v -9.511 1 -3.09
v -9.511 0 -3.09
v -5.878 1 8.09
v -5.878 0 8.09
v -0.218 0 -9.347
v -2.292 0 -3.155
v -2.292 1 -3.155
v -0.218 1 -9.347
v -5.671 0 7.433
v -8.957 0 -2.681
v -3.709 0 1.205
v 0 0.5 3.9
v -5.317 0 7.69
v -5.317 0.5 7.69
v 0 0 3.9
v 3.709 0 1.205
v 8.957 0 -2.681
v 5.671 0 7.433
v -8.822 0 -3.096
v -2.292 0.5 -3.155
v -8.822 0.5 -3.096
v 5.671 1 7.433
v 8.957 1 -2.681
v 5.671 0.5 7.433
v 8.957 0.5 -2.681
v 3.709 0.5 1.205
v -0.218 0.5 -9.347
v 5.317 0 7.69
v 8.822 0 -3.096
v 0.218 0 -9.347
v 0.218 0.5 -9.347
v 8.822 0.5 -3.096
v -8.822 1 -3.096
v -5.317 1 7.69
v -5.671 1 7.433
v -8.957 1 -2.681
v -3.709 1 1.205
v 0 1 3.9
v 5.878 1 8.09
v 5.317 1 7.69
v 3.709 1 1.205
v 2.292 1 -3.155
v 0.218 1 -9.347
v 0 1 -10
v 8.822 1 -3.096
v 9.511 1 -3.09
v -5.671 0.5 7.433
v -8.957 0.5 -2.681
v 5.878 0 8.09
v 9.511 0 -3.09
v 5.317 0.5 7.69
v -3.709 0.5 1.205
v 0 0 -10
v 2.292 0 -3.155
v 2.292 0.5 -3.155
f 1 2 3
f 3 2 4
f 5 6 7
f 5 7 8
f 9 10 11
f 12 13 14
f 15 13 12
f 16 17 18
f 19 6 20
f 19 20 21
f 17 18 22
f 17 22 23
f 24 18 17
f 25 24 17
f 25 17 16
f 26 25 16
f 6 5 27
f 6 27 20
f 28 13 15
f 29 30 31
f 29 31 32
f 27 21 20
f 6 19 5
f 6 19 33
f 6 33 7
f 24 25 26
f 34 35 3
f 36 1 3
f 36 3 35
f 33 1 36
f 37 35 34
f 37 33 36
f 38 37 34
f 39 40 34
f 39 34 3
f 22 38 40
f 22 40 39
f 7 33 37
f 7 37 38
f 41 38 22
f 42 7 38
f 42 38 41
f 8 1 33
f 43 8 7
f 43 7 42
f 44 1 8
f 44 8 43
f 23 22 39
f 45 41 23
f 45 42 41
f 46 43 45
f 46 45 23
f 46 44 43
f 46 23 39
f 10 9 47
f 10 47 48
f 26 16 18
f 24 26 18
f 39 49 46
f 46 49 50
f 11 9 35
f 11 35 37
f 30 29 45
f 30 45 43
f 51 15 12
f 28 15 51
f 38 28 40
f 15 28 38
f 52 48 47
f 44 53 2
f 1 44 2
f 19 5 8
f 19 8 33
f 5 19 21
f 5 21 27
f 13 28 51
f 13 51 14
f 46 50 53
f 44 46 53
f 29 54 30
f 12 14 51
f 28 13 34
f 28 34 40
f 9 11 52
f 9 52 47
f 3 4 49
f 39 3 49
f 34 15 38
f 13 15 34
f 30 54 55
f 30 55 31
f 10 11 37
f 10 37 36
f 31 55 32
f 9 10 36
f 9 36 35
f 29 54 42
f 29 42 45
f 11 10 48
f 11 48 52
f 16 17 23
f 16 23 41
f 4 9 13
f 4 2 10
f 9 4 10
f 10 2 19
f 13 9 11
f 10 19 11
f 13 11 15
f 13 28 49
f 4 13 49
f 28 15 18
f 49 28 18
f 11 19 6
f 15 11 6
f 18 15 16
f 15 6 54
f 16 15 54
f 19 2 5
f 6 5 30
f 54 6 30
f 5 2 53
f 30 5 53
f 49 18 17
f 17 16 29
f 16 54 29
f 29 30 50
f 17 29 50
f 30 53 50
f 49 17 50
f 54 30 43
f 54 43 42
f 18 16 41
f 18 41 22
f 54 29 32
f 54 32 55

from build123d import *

# Parameters (mm, degrees)
BOSS_EXTRUDE1_DEPTH   = 1
BOSS_EXTRUDE2_DEPTH   = 0.5
BOSS_EXTRUDE2_2_DEPTH = 0.5
BOSS_EXTRUDE2_3_DEPTH = 0.5
BOSS_EXTRUDE2_4_DEPTH = 0.5
BOSS_EXTRUDE2_5_DEPTH = 0.5


with BuildPart() as part:
    # Sketch1 → Boss-Extrude1 (new body)
    with BuildSketch(Plane(origin=(0, 0, 0), x_dir=(1, 0, 0), z_dir=(0, 1, 0))):
        Polygon((9.510565163, 3.090169944), (0, 10), (-9.510565163, 3.090169944), (-5.877852523, -8.090169944), (5.877852523, -8.090169944), align=None)
        Polygon((5.6706701, -7.433384684), (8.956902373, 2.68059828), (3.709120414, -1.205166278), align=None, mode=Mode.SUBTRACT)
        Polygon((8.821902373, 3.096085557), (0.218434588, 9.346870791), (2.292362484, 3.155166278), align=None, mode=Mode.SUBTRACT)
        Polygon((-0.218434588, 9.346870791), (-8.821902373, 3.096085557), (-2.292362484, 3.155166278), align=None, mode=Mode.SUBTRACT)
        Polygon((-8.956902373, 2.68059828), (-5.6706701, -7.433384684), (-3.709120414, -1.205166278), align=None, mode=Mode.SUBTRACT)
        Polygon((-5.316743775, -7.690169944), (5.317235512, -7.690169944), (0, -3.9), align=None, mode=Mode.SUBTRACT)
    extrude(amount=BOSS_EXTRUDE1_DEPTH)


with BuildPart() as body_2:
    # Sketch3 → Boss-Extrude2 (new body)
    with BuildSketch(Plane.XZ):
        Polygon((8.956902373, -2.68059828), (3.709120414, 1.205166278), (5.6706701, 7.433384684), align=None)
    extrude(amount=-BOSS_EXTRUDE2_DEPTH)


with BuildPart() as body_3:
    # Sketch3 → Boss-Extrude2 2 (new body)
    with BuildSketch(Plane.XZ):
        Polygon((8.821902373, -3.096085557), (2.292362484, -3.155166278), (0.218434588, -9.346870791), align=None)
    extrude(amount=-BOSS_EXTRUDE2_2_DEPTH)


with BuildPart() as body_4:
    # Sketch3 → Boss-Extrude2 3 (new body)
    with BuildSketch(Plane.XZ):
        Polygon((-0.218434588, -9.346870791), (-2.292362484, -3.155166278), (-8.821902373, -3.096085557), align=None)
    extrude(amount=-BOSS_EXTRUDE2_3_DEPTH)


with BuildPart() as body_5:
    # Sketch3 → Boss-Extrude2 4 (new body)
    with BuildSketch(Plane.XZ):
        Polygon((-8.956902373, -2.68059828), (-3.709120414, 1.205166278), (-5.6706701, 7.433384684), align=None)
    extrude(amount=-BOSS_EXTRUDE2_4_DEPTH)


with BuildPart() as body_6:
    # Sketch3 → Boss-Extrude2 5 (new body)
    with BuildSketch(Plane.XZ):
        Polygon((0, 3.9), (5.317235512, 7.690169944), (-5.316743775, 7.690169944), align=None)
    extrude(amount=-BOSS_EXTRUDE2_5_DEPTH)


solid = Compound([part.part, body_2.part, body_3.part, body_4.part, body_5.part, body_6.part])
